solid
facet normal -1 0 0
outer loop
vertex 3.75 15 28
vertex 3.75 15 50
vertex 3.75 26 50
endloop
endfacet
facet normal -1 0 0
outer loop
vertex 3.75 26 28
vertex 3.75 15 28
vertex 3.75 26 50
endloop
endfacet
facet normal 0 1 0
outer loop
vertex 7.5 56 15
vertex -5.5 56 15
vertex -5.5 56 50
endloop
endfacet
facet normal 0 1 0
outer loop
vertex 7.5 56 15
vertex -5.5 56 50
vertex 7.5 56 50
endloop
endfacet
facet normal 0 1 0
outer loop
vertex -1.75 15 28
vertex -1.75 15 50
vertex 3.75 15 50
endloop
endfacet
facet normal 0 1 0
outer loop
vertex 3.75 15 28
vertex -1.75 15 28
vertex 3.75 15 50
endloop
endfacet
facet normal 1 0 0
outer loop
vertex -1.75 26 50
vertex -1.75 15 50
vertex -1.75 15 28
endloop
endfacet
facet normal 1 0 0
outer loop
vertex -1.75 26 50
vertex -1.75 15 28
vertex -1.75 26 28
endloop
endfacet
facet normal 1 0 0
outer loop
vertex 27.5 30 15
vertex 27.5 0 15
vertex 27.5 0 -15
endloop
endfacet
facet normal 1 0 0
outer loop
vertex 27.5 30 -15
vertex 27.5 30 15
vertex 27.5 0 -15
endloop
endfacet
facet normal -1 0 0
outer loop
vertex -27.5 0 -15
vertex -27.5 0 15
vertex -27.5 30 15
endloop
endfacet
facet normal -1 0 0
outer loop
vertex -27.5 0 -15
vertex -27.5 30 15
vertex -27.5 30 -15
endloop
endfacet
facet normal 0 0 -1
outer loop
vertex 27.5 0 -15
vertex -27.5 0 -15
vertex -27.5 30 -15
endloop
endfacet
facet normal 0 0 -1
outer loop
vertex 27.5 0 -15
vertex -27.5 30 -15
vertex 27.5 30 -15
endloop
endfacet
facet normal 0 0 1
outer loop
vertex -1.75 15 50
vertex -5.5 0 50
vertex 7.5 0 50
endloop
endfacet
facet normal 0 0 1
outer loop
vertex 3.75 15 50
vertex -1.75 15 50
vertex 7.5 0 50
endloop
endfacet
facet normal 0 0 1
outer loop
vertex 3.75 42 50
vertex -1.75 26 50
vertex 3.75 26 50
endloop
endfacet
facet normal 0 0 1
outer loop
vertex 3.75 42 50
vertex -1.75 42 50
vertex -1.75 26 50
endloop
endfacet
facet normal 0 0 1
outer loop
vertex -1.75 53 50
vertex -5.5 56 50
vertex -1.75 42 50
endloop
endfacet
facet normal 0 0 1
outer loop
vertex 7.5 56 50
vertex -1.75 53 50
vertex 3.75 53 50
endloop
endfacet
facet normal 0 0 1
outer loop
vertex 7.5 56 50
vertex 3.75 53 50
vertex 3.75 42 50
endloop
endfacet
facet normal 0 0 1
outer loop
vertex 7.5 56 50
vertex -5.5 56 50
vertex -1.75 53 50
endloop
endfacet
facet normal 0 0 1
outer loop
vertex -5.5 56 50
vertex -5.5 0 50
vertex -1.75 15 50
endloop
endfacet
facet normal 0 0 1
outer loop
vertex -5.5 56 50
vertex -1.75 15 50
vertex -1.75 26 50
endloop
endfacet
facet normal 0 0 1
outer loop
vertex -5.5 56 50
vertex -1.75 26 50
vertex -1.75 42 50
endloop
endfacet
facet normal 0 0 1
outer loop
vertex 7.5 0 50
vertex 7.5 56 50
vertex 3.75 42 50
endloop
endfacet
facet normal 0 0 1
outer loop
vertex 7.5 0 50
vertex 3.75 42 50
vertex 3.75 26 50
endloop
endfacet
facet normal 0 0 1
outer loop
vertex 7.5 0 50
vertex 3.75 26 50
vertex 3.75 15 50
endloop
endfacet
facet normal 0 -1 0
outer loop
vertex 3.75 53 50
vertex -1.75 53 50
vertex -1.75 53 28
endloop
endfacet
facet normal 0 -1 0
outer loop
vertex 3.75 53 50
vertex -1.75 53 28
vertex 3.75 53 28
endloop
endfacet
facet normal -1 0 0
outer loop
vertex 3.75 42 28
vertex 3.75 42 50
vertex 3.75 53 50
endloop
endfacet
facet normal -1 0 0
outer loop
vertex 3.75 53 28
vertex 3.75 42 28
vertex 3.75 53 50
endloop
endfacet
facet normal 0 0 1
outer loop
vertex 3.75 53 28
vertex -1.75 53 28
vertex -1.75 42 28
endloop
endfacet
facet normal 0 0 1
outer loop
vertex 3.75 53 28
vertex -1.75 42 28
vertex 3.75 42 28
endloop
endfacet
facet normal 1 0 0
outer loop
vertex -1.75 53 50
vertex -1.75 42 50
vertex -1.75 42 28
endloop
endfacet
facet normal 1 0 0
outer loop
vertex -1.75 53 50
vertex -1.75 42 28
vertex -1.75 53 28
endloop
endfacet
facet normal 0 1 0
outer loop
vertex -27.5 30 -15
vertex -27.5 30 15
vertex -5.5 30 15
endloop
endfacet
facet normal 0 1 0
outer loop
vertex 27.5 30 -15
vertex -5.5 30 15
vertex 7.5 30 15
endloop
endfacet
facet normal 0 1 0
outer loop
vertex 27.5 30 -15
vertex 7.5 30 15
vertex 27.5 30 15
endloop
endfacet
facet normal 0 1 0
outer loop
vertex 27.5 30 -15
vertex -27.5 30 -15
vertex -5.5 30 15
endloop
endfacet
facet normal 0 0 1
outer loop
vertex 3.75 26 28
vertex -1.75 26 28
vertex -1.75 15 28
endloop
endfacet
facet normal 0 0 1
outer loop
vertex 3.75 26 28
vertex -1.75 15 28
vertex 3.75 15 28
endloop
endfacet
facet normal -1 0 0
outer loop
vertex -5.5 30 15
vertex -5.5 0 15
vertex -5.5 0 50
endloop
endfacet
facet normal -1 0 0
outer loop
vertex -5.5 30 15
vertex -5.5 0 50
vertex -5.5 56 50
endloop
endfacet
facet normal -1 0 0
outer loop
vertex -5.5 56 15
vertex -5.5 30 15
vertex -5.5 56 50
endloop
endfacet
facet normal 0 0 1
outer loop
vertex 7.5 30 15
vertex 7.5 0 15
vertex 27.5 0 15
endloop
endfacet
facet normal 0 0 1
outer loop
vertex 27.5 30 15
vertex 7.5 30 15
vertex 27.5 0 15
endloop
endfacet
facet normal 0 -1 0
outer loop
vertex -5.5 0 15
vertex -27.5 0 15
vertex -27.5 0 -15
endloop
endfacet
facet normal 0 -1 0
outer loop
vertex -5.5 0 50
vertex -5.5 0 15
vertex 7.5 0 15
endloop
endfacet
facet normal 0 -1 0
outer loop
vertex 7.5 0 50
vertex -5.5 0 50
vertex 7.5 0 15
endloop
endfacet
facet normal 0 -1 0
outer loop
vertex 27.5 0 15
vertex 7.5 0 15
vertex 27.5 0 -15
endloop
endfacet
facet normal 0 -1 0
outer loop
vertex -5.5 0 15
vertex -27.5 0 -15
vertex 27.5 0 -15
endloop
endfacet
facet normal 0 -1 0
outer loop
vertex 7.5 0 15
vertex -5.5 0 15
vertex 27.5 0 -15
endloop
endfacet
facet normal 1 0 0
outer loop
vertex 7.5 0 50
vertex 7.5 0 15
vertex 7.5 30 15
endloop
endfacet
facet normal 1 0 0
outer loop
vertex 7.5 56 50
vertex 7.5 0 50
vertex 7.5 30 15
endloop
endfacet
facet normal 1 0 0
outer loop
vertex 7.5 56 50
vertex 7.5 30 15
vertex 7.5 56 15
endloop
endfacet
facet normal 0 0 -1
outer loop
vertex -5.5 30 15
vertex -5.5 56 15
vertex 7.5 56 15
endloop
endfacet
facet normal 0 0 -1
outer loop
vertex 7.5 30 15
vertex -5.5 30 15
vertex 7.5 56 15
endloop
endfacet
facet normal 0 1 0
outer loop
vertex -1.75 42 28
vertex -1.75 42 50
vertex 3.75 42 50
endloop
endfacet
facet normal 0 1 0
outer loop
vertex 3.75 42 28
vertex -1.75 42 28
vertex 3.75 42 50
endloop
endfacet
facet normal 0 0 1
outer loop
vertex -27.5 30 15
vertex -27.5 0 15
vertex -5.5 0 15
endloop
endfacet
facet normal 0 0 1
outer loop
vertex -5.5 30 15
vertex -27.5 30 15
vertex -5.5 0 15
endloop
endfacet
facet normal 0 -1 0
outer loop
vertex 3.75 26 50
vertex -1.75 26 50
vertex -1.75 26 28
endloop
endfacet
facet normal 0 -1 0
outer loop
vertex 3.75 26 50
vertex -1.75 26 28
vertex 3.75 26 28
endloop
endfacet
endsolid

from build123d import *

# Parameters (mm, degrees)
SKETCH1_W           = 55
SKETCH1_H           = 30
BOSS_EXTRUDE1_DEPTH = 30
SKETCH2_W           = 13
SKETCH2_H           = 56
BOSS_EXTRUDE2_DEPTH = 35
SKETCH3_W           = 5.5
SKETCH3_H           = 11
CUT_EXTRUDE1_DEPTH  = 22


with BuildPart() as part:
    # Sketch1 → Boss-Extrude1 (new body)
    with BuildSketch(Plane(origin=(0, 0, 0), x_dir=(1, 0, 0), z_dir=(0, 1, 0))):
        Rectangle(SKETCH1_W, SKETCH1_H)
    extrude(amount=BOSS_EXTRUDE1_DEPTH)

    # Sketch2 → Boss-Extrude2 (add)
    with BuildSketch(Plane.XY.offset(15)):
        with Locations((1, 28)):
            Rectangle(SKETCH2_W, SKETCH2_H)
    extrude(amount=BOSS_EXTRUDE2_DEPTH)

    # Sketch3 → Cut-Extrude1 (cut)
    with BuildSketch(Plane.XY.offset(50)):
        with Locations((1, 20.5)):
            Rectangle(SKETCH3_W, SKETCH3_H)
        with Locations((1, 47.5)):
            Rectangle(SKETCH3_W, SKETCH3_H)
    extrude(amount=-CUT_EXTRUDE1_DEPTH, mode=Mode.SUBTRACT)


solid = part.part
